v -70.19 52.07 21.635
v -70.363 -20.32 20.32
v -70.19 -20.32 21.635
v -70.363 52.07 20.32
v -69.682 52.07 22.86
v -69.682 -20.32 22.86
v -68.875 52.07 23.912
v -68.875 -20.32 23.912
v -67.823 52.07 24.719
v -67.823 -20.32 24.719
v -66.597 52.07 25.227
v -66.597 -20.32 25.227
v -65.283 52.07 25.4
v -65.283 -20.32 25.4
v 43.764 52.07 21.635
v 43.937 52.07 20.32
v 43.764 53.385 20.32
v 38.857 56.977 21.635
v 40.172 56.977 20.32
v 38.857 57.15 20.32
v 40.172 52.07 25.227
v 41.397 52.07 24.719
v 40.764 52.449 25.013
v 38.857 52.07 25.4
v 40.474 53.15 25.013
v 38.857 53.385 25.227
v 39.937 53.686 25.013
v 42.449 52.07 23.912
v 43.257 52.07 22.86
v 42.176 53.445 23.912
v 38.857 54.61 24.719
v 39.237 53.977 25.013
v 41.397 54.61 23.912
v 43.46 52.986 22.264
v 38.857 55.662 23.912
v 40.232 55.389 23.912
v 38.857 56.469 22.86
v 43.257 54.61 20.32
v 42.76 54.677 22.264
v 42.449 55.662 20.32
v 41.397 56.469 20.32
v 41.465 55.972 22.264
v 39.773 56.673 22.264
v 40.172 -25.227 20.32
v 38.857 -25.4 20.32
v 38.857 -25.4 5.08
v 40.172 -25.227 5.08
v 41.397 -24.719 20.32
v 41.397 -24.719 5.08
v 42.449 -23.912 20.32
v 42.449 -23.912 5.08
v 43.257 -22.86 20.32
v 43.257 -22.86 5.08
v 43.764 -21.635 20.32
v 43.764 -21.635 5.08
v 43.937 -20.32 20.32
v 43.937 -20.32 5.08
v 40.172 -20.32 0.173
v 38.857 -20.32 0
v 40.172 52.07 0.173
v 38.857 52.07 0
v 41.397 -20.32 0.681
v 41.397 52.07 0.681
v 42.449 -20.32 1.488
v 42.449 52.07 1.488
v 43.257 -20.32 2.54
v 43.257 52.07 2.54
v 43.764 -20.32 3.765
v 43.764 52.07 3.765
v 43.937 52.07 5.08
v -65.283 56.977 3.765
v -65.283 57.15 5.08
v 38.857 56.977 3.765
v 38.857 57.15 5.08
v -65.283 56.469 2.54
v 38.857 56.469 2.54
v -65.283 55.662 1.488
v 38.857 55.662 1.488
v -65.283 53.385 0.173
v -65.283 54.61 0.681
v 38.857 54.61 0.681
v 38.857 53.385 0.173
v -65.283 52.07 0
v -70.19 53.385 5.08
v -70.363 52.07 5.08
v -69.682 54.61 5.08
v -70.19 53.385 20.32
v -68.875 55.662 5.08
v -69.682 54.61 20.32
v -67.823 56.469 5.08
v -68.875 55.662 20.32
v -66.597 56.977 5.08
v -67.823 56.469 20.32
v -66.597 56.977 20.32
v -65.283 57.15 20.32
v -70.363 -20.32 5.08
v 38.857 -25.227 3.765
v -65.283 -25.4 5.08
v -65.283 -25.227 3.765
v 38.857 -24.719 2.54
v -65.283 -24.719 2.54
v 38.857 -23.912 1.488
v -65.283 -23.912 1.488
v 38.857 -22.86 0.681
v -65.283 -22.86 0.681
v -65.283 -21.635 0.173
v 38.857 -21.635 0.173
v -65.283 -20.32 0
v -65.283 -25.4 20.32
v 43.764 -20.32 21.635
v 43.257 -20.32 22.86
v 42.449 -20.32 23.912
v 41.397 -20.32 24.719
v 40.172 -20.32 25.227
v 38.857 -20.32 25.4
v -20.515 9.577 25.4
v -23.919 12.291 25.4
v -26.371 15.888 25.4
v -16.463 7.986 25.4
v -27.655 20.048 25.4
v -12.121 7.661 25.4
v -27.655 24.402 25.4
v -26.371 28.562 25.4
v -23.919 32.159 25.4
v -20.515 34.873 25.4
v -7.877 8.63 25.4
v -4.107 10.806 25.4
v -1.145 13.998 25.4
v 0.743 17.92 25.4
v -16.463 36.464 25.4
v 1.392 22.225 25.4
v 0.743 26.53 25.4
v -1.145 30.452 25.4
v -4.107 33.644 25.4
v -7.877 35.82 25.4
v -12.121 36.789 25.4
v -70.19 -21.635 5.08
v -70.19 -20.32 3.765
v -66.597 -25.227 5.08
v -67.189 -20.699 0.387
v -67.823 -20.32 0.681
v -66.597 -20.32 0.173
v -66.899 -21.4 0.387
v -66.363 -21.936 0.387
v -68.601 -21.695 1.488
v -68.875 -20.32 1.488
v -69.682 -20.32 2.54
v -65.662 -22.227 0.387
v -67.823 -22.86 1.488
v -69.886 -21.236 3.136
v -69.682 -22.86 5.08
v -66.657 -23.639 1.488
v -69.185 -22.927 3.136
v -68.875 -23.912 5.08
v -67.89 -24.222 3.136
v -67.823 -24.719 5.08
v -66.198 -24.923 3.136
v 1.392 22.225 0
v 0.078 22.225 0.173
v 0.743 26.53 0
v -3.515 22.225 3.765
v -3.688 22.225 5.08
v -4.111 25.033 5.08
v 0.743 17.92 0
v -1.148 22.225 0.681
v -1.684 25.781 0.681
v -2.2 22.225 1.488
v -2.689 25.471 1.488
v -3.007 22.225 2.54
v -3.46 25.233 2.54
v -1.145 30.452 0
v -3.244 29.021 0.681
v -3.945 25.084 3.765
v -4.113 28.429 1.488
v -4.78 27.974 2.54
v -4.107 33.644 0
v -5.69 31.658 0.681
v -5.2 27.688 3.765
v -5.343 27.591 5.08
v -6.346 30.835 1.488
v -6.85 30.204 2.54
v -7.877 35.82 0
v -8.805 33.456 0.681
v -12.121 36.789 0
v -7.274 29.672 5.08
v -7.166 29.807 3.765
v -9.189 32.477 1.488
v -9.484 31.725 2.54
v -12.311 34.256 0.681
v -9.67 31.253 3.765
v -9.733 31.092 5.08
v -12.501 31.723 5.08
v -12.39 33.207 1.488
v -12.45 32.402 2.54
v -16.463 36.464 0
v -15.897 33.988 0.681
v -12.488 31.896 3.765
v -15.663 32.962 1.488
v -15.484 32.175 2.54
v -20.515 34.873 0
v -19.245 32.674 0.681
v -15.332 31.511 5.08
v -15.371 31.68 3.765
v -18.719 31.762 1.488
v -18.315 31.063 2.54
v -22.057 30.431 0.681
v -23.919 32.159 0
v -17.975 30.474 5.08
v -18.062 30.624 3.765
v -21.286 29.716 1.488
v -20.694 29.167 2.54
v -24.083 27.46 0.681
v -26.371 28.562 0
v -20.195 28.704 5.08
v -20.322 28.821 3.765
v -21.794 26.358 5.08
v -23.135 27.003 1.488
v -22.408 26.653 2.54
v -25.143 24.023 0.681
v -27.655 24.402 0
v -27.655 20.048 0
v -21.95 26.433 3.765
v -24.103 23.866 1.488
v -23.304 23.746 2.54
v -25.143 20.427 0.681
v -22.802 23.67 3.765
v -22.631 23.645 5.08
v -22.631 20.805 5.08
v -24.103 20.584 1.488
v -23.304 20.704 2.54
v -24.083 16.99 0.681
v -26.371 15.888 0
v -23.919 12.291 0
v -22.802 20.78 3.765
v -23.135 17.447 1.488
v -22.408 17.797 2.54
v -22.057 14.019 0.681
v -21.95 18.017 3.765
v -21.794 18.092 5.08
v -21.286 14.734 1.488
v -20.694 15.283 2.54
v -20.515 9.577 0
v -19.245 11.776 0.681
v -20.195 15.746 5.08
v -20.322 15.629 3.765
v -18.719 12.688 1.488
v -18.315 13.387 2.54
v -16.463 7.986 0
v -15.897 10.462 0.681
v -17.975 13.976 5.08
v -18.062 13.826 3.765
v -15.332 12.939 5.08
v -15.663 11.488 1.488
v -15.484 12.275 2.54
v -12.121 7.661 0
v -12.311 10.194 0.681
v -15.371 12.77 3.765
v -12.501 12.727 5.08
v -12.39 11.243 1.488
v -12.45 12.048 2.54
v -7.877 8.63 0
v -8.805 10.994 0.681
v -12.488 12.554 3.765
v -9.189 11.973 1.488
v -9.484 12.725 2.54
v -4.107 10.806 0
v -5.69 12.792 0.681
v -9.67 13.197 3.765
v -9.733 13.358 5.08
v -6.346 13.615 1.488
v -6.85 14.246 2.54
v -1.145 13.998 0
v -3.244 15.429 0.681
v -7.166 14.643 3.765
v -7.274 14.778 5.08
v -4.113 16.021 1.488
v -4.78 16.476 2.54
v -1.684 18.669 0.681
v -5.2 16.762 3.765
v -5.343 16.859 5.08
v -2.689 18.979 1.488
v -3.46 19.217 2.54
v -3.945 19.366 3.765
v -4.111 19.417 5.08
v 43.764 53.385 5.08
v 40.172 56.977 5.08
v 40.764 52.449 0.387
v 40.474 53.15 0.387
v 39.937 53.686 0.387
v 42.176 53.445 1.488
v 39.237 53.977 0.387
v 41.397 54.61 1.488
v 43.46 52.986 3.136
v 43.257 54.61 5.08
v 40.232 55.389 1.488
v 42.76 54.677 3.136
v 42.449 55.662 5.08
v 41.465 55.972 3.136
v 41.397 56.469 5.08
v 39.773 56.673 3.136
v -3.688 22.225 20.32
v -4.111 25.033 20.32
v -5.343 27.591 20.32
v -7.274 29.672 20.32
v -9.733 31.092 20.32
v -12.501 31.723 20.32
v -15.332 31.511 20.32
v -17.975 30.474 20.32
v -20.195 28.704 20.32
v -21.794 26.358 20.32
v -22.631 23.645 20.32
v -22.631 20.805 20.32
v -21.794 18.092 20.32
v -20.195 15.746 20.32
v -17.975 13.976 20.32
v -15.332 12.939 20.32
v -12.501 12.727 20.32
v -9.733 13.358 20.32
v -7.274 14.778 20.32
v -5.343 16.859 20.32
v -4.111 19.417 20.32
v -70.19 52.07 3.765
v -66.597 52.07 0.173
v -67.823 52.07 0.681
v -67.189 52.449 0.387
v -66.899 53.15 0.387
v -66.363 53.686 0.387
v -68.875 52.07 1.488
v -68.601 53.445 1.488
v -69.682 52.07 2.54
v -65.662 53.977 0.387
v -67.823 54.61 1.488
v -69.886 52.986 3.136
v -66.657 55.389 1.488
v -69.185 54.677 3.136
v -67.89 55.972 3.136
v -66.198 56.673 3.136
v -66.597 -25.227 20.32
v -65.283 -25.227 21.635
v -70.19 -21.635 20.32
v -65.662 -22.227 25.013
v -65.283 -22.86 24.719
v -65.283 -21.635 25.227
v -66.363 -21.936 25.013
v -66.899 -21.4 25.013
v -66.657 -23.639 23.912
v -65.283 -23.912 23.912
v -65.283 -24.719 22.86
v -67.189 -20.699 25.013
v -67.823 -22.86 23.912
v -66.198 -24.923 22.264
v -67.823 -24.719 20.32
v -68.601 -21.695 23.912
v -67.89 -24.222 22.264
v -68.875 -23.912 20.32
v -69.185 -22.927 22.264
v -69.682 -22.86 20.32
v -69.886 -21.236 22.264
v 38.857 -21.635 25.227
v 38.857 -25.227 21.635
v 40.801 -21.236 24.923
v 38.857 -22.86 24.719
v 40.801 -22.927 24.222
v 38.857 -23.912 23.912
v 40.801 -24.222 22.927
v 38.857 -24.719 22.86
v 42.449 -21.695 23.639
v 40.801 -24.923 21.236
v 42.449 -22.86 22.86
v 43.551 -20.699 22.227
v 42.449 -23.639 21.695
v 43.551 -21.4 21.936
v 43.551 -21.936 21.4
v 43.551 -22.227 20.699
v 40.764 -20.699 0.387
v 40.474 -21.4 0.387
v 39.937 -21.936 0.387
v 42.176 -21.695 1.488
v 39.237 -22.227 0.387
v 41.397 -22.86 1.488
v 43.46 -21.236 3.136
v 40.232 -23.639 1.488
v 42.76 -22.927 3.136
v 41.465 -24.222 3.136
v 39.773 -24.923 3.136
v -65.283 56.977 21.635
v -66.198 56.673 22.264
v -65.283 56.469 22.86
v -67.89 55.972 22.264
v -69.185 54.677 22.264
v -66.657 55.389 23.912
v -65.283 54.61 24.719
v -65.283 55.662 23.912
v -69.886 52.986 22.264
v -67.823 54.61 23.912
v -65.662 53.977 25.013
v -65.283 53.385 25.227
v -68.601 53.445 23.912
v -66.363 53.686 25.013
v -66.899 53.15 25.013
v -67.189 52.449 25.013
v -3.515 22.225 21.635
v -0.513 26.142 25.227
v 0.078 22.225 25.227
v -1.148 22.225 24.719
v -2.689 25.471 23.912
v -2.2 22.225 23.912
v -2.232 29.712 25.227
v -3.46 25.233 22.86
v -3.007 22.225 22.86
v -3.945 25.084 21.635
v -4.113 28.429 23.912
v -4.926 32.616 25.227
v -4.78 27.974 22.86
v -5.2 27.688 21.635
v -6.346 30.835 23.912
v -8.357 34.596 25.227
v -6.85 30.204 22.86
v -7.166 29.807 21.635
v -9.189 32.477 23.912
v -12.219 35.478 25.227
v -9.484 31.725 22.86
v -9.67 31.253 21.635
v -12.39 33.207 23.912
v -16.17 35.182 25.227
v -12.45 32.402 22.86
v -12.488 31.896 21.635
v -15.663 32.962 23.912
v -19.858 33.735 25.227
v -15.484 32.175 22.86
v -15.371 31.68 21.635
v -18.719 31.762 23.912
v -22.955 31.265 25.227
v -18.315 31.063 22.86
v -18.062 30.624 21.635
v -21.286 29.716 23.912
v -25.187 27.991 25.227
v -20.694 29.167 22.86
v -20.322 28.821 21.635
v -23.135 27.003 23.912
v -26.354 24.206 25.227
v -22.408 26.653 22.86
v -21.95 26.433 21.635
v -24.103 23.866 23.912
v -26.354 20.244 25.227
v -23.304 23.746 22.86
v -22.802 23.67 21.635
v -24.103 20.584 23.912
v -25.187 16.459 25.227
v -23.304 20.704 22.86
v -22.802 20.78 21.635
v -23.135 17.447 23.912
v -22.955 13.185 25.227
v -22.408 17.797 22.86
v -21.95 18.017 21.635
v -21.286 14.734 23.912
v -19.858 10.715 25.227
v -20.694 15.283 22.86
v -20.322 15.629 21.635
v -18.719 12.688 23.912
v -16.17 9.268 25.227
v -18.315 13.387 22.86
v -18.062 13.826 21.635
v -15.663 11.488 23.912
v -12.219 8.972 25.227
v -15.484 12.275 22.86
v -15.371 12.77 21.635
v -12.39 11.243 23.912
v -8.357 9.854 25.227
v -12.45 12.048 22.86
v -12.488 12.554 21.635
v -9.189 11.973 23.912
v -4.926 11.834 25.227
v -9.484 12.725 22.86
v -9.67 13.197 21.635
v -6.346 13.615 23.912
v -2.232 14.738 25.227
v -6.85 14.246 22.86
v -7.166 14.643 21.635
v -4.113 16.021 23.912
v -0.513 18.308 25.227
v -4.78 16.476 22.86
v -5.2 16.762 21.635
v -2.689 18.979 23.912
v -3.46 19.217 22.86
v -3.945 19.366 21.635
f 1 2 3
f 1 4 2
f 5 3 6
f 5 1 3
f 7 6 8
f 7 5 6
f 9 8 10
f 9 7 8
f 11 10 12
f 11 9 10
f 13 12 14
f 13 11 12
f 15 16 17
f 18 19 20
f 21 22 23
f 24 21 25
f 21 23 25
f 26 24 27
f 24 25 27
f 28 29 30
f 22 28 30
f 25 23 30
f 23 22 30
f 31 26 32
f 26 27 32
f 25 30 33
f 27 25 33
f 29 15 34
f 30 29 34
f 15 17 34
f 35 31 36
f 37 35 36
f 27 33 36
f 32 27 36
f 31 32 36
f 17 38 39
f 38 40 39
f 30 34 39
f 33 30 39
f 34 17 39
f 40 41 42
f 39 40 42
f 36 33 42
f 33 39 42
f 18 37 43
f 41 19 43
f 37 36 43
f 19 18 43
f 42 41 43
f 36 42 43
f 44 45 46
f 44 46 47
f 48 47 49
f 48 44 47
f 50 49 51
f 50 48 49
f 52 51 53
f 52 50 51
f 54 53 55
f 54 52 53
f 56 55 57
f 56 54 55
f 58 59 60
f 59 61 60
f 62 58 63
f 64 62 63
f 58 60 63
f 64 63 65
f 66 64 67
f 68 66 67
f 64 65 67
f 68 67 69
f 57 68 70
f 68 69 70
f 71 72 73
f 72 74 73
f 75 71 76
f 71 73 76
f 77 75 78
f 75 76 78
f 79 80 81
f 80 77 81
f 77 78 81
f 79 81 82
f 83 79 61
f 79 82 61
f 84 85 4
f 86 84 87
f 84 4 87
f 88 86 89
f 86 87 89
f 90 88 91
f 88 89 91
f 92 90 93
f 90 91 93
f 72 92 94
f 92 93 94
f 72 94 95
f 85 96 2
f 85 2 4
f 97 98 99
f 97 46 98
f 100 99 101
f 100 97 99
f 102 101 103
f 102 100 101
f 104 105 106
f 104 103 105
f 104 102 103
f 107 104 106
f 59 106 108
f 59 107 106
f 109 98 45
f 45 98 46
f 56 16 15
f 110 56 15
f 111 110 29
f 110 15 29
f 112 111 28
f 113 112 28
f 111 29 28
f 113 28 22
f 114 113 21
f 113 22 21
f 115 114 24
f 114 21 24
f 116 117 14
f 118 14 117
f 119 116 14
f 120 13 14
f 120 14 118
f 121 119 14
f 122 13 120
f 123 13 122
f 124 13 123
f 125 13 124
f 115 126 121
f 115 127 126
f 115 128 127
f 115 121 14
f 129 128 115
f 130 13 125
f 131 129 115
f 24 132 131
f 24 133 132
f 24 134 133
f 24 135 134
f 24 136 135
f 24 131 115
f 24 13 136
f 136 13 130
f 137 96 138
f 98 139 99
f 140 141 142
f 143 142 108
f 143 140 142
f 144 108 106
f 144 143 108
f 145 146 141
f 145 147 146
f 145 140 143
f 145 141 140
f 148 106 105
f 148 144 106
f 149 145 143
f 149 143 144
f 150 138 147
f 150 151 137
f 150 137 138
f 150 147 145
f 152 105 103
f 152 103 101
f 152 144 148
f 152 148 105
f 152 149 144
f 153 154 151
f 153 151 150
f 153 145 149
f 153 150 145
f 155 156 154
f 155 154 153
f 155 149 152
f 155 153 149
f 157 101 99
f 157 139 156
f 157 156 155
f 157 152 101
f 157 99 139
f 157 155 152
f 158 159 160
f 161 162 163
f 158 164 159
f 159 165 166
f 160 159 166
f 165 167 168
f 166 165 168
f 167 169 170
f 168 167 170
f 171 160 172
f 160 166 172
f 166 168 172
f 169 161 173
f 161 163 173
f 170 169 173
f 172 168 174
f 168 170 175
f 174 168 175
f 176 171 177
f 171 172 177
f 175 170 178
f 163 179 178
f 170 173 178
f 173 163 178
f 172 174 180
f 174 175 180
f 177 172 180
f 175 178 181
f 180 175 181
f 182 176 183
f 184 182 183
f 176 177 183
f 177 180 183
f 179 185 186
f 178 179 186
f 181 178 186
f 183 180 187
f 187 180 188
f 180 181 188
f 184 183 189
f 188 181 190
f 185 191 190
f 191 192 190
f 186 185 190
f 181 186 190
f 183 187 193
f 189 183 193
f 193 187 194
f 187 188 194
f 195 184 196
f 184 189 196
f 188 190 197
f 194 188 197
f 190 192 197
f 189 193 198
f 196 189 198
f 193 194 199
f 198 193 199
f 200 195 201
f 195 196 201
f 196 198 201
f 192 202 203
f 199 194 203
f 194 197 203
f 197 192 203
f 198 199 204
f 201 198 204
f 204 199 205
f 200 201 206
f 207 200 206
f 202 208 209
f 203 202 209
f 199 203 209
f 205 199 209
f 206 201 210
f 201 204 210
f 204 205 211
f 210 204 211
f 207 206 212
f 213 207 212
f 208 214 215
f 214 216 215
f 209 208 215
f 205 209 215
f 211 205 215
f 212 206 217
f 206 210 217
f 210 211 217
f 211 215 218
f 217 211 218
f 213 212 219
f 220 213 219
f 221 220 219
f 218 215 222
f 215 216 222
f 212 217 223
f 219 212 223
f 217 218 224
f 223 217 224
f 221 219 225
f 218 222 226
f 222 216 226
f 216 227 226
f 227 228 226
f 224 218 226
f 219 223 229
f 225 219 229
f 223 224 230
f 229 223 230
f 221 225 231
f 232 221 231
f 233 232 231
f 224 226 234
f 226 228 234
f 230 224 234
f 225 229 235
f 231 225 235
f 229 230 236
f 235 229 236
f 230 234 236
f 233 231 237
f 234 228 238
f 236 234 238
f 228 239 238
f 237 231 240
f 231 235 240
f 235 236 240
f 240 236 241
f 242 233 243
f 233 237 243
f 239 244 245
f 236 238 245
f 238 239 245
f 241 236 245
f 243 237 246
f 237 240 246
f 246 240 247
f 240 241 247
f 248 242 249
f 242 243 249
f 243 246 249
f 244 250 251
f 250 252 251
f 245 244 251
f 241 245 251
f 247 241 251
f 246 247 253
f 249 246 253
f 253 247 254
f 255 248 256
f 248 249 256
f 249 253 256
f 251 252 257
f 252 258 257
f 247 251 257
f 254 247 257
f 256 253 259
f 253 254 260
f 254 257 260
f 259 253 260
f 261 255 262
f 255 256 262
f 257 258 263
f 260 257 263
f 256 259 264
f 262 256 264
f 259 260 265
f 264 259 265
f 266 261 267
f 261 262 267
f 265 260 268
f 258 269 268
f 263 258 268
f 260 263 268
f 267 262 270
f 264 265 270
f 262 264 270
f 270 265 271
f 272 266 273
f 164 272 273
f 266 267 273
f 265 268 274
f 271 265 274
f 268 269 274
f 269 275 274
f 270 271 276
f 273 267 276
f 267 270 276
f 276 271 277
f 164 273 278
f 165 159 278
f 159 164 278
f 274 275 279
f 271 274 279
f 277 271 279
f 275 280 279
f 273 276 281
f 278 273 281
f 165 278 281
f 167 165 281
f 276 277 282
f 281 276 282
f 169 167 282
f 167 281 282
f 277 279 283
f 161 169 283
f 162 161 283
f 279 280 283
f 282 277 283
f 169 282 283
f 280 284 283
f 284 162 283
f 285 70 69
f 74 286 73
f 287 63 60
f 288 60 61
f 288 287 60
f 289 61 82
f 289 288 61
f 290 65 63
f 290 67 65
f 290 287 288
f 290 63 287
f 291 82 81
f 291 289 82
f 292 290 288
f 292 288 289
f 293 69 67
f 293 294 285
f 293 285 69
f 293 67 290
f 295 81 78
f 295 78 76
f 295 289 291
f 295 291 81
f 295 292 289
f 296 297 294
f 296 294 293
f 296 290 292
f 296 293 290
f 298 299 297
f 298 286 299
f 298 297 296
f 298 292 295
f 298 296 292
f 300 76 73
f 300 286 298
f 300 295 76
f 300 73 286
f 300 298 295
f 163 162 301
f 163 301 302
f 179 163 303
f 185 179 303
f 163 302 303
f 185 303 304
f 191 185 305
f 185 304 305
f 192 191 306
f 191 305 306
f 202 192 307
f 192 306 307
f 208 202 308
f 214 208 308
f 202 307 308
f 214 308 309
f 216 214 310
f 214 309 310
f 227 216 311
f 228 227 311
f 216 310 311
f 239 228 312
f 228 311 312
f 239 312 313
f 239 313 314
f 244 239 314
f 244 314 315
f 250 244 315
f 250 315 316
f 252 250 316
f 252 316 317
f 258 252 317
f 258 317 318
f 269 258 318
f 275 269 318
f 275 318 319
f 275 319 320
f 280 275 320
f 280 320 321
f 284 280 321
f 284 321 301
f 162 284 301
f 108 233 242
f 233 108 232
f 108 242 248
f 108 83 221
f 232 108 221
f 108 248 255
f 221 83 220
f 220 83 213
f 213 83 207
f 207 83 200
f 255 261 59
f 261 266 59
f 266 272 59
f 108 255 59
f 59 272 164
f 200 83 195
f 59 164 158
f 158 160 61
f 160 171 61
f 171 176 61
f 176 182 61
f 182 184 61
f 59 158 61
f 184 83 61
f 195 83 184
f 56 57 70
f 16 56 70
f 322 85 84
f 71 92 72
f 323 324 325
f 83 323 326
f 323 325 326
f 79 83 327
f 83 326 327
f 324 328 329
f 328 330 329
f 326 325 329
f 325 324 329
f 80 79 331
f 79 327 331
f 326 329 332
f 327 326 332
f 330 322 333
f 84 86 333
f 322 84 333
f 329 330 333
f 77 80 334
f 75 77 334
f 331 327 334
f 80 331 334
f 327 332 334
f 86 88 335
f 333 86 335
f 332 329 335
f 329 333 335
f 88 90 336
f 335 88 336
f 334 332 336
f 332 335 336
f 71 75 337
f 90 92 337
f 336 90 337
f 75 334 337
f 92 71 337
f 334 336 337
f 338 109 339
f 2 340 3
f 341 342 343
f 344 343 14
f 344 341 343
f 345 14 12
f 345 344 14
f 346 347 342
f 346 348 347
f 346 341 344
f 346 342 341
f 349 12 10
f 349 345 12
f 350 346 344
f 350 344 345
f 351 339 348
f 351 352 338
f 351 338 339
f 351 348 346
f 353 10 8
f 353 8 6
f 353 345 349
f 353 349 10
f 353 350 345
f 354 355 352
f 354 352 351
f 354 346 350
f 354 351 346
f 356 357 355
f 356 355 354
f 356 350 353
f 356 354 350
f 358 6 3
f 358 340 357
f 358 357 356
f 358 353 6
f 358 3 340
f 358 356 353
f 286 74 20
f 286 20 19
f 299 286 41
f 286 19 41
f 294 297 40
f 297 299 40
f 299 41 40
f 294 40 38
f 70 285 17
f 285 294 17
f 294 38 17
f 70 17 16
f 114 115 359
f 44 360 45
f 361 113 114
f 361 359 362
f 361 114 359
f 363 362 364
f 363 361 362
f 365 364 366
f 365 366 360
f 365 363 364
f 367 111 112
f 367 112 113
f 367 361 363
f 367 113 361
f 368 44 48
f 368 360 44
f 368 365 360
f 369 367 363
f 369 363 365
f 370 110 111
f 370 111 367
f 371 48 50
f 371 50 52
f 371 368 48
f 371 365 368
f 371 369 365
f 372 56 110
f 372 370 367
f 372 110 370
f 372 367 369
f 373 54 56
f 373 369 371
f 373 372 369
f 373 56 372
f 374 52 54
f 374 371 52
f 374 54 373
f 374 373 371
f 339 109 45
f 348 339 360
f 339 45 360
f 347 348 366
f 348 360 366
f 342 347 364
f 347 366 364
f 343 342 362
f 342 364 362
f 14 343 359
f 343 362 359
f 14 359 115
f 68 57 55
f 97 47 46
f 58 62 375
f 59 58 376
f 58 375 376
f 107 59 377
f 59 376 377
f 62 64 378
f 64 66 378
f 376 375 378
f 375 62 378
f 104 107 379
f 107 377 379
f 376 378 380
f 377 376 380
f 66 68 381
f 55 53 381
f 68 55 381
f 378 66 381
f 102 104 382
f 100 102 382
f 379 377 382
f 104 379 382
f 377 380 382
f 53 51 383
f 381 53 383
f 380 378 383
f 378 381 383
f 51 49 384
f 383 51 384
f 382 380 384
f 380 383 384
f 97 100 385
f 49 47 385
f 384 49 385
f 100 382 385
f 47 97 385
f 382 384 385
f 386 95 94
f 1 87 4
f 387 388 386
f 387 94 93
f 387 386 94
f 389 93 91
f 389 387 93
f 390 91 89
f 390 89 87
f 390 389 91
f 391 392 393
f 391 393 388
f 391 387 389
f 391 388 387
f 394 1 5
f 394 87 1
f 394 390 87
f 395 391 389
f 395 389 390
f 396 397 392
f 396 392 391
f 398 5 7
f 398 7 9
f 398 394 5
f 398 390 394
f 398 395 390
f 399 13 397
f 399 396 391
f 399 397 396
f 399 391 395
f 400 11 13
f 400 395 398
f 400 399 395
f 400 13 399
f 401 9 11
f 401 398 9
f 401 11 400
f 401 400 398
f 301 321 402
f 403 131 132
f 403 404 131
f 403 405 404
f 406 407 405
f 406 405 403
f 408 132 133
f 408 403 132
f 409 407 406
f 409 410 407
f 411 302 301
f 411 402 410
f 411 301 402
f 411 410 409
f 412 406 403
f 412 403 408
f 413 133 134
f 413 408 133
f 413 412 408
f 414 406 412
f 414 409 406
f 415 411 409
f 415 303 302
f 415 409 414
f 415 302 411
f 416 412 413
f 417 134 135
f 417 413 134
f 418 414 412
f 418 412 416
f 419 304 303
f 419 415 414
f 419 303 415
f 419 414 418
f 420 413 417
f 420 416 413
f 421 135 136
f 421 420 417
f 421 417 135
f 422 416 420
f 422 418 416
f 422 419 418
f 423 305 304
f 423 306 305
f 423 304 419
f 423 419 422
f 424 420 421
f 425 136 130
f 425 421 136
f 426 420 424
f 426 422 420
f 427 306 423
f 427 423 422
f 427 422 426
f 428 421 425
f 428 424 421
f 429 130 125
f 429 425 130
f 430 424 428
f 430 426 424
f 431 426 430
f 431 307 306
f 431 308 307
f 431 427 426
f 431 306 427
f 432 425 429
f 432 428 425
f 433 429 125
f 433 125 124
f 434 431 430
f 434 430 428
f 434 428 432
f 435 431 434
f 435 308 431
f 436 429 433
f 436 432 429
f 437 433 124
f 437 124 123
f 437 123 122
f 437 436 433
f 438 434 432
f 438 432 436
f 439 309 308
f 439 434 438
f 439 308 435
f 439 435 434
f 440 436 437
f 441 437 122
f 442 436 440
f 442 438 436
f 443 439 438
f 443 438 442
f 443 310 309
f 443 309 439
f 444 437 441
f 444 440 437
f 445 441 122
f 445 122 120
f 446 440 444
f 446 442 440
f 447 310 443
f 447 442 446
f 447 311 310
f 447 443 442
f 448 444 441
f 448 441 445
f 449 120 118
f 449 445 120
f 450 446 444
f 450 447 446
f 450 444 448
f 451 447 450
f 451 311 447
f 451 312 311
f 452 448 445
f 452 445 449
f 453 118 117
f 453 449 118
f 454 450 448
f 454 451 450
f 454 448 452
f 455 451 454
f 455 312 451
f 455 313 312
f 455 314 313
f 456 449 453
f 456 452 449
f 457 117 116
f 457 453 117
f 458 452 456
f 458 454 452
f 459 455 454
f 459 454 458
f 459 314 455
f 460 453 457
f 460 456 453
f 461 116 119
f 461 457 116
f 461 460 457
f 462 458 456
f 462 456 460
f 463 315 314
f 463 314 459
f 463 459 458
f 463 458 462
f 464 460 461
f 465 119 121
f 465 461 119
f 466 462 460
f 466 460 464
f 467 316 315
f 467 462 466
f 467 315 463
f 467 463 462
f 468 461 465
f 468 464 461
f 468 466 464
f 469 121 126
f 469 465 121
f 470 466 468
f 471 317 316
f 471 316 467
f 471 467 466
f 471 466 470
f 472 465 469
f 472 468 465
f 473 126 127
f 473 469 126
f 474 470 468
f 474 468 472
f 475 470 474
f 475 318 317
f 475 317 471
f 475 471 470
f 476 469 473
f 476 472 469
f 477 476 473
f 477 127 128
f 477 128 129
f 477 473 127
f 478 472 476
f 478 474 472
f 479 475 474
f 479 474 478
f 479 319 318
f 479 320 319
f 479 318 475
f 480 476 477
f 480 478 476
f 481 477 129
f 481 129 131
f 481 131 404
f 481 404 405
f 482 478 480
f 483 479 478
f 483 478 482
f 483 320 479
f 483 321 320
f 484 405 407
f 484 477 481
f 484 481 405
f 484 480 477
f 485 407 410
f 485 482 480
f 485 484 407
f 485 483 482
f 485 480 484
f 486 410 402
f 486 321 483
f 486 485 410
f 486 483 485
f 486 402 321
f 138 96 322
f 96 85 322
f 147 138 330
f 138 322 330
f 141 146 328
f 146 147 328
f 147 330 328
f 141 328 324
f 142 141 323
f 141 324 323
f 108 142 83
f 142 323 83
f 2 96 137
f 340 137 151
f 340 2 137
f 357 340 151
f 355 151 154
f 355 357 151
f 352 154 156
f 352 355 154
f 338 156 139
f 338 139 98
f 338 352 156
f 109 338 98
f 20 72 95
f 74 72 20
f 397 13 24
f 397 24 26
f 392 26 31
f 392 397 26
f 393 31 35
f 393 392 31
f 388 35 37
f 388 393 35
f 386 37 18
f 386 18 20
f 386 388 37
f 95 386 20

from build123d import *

# Parameters (mm, degrees)
F0_W         = 114.3
F0_H         = 82.55
F1_DEPTH     = 25.4
F2_R         = 9.525
F3_DEPTH     = 45.21898
F4_R         = 5.08
F5_T1_DEPTH  = 104.14
F5_T3_DEPTH  = 72.39
F5_S7_W      = 5.08
F5_S7_H      = 5.08
F5_T8_DEPTH  = 5.08
F5_S13_W     = 5.08
F5_S13_H     = 5.08
F5_T14_DEPTH = 5.08
F5_T20_ANGLE = 90


# Not quite as in the source:
# - a fillet or chamfer that OpenCascade refuses, or shapes differently, is made with other operations: its cross-section is extruded or revolved along the edge and cut away or added


with BuildPart() as f1:
    # F0 (on Top) → F1 (new body)
    with BuildSketch(Plane.XY):
        with Locations((-13.2126640528, 15.875)):
            Rectangle(F0_W, F0_H)
    extrude(amount=F1_DEPTH)

    # F2 (on face) → F3 (cut)
    with BuildSketch(Plane.XY.offset(25.4)):
        with Locations((-13.2126640528, 22.225)):
            Circle(F2_R)
    extrude(amount=-F3_DEPTH, mode=Mode.SUBTRACT)

    # F4
    f4_edges = [f1.edges().sort_by_distance(p)[0] for p in [
        (43.937336, 57.15, 12.7),
        (-70.362664, 57.15, 12.7),
        (43.937336, -25.4, 12.7),
        (-70.362664, -25.4, 12.7),
        (-13.212664, -25.4, 25.4),
        (-70.362664, 15.875, 25.4),
        (-70.362664, 15.875, 0),
        (43.937336, 15.875, 0),
        (-13.212664, -25.4, 0),
        (-13.212664, 57.15, 0),
        (-22.737664, 22.225, 0),
    ]]
    fillet(f4_edges, radius=F4_R)

    # F5: fillet of radius 5.08 on 2 edges, made by hand

    # F5_s2 → F5_t1 (cut)
    with BuildSketch(Plane.YZ.offset(-65.2826640528)):
        with BuildLine():
            ThreePointArc((52.07, 25.4), (55.6621024484, 23.9121024484), (57.15, 20.32))
            Line((57.15, 20.32), (57.15, 25.4))
            Line((57.15, 25.4), (52.07, 25.4))
        make_face()
    extrude(amount=F5_T1_DEPTH, mode=Mode.SUBTRACT)

    # F5_s4 → F5_t3 (cut)
    with BuildSketch(Plane.XZ.offset(-52.07)):
        with BuildLine():
            ThreePointArc((43.9373359472, 20.32), (42.4494383956, 23.9121024484), (38.8573359472, 25.4))
            Line((38.8573359472, 25.4), (43.9373359472, 25.4))
            Line((43.9373359472, 25.4), (43.9373359472, 20.32))
        make_face()
    extrude(amount=F5_T3_DEPTH, mode=Mode.SUBTRACT)


with BuildPart() as f5_tool6:
    # F5_s7 → F5_t8 (new body)
    with BuildSketch(Plane.XY.offset(20.32)):
        with Locations((-67.8226640528, 54.61)):
            Rectangle(F5_S7_W, F5_S7_H)
    extrude(amount=F5_T8_DEPTH)

    # F5_s9 → F5_t10 (revolve, cut)
    with BuildSketch(Plane(origin=(-65.2826640528, 52.07, 20.32), x_dir=(0.7071067812, -0.7071067812, 0), z_dir=(-0.7071067812, -0.7071067812, 0))):
        with BuildLine():
            ThreePointArc((0, -5.08), (5.08, 0), (0, 5.08))
            Line((0, 5.08), (0, -5.08))
        make_face()
    revolve(axis=Axis((-65.2826640528, 52.07, 20.32), (0, 0, 1)), mode=Mode.SUBTRACT)


with BuildPart() as f1_1:
    add(f1.part)

    # F5_t5: cut F5_tool6
    add(f5_tool6.part, mode=Mode.SUBTRACT)


with BuildPart() as f5_tool12:
    # F5_s13 → F5_t14 (new body)
    with BuildSketch(Plane.YZ.offset(38.8573359472)):
        with Locations((-22.86, 22.86)):
            Rectangle(F5_S13_W, F5_S13_H)
    extrude(amount=F5_T14_DEPTH)

    # F5_s15 → F5_t16 (revolve, cut)
    with BuildSketch(Plane(origin=(38.8573359472, -20.32, 20.32), x_dir=(0, 0.7071067812, -0.7071067812), z_dir=(0, -0.7071067812, -0.7071067812))):
        with BuildLine():
            ThreePointArc((0, -5.08), (5.08, 0), (0, 5.08))
            Line((0, 5.08), (0, -5.08))
        make_face()
    revolve(axis=Axis((38.8573359472, -20.32, 20.32), (1, 0, 0)), mode=Mode.SUBTRACT)


with BuildPart() as f1_2:
    add(f1_1.part)

    # F5_t11: cut F5_tool12
    add(f5_tool12.part, mode=Mode.SUBTRACT)

    # F5_s17 → F5_t18 (revolve, cut)
    with BuildSketch(Plane.XZ.offset(-22.225)):
        with BuildLine():
            ThreePointArc((1.3923359472, 25.4), (-2.1997665013, 23.9121024484), (-3.6876640528, 20.32))
            Line((-3.6876640528, 20.32), (-3.6876640528, 25.4))
            Line((-3.6876640528, 25.4), (1.3923359472, 25.4))
        make_face()
    revolve(axis=Axis((-13.2126640528, 22.225, 25.4), (0, 0, 1)), mode=Mode.SUBTRACT)

    # F5_s19 → F5_t20 (revolve, cut)
    with BuildSketch(Plane.XZ.offset(-52.07)):
        with BuildLine():
            ThreePointArc((38.8573359472, 25.4), (42.4494383956, 23.9121024484), (43.9373359472, 20.32))
            Line((43.9373359472, 20.32), (43.9373359472, 25.4))
            Line((43.9373359472, 25.4), (38.8573359472, 25.4))
        make_face()
    revolve(axis=Axis((38.8573359472, 52.07, 25.4), (0, 0, 1)), revolution_arc=F5_T20_ANGLE, mode=Mode.SUBTRACT)


solid = f1_2.part
